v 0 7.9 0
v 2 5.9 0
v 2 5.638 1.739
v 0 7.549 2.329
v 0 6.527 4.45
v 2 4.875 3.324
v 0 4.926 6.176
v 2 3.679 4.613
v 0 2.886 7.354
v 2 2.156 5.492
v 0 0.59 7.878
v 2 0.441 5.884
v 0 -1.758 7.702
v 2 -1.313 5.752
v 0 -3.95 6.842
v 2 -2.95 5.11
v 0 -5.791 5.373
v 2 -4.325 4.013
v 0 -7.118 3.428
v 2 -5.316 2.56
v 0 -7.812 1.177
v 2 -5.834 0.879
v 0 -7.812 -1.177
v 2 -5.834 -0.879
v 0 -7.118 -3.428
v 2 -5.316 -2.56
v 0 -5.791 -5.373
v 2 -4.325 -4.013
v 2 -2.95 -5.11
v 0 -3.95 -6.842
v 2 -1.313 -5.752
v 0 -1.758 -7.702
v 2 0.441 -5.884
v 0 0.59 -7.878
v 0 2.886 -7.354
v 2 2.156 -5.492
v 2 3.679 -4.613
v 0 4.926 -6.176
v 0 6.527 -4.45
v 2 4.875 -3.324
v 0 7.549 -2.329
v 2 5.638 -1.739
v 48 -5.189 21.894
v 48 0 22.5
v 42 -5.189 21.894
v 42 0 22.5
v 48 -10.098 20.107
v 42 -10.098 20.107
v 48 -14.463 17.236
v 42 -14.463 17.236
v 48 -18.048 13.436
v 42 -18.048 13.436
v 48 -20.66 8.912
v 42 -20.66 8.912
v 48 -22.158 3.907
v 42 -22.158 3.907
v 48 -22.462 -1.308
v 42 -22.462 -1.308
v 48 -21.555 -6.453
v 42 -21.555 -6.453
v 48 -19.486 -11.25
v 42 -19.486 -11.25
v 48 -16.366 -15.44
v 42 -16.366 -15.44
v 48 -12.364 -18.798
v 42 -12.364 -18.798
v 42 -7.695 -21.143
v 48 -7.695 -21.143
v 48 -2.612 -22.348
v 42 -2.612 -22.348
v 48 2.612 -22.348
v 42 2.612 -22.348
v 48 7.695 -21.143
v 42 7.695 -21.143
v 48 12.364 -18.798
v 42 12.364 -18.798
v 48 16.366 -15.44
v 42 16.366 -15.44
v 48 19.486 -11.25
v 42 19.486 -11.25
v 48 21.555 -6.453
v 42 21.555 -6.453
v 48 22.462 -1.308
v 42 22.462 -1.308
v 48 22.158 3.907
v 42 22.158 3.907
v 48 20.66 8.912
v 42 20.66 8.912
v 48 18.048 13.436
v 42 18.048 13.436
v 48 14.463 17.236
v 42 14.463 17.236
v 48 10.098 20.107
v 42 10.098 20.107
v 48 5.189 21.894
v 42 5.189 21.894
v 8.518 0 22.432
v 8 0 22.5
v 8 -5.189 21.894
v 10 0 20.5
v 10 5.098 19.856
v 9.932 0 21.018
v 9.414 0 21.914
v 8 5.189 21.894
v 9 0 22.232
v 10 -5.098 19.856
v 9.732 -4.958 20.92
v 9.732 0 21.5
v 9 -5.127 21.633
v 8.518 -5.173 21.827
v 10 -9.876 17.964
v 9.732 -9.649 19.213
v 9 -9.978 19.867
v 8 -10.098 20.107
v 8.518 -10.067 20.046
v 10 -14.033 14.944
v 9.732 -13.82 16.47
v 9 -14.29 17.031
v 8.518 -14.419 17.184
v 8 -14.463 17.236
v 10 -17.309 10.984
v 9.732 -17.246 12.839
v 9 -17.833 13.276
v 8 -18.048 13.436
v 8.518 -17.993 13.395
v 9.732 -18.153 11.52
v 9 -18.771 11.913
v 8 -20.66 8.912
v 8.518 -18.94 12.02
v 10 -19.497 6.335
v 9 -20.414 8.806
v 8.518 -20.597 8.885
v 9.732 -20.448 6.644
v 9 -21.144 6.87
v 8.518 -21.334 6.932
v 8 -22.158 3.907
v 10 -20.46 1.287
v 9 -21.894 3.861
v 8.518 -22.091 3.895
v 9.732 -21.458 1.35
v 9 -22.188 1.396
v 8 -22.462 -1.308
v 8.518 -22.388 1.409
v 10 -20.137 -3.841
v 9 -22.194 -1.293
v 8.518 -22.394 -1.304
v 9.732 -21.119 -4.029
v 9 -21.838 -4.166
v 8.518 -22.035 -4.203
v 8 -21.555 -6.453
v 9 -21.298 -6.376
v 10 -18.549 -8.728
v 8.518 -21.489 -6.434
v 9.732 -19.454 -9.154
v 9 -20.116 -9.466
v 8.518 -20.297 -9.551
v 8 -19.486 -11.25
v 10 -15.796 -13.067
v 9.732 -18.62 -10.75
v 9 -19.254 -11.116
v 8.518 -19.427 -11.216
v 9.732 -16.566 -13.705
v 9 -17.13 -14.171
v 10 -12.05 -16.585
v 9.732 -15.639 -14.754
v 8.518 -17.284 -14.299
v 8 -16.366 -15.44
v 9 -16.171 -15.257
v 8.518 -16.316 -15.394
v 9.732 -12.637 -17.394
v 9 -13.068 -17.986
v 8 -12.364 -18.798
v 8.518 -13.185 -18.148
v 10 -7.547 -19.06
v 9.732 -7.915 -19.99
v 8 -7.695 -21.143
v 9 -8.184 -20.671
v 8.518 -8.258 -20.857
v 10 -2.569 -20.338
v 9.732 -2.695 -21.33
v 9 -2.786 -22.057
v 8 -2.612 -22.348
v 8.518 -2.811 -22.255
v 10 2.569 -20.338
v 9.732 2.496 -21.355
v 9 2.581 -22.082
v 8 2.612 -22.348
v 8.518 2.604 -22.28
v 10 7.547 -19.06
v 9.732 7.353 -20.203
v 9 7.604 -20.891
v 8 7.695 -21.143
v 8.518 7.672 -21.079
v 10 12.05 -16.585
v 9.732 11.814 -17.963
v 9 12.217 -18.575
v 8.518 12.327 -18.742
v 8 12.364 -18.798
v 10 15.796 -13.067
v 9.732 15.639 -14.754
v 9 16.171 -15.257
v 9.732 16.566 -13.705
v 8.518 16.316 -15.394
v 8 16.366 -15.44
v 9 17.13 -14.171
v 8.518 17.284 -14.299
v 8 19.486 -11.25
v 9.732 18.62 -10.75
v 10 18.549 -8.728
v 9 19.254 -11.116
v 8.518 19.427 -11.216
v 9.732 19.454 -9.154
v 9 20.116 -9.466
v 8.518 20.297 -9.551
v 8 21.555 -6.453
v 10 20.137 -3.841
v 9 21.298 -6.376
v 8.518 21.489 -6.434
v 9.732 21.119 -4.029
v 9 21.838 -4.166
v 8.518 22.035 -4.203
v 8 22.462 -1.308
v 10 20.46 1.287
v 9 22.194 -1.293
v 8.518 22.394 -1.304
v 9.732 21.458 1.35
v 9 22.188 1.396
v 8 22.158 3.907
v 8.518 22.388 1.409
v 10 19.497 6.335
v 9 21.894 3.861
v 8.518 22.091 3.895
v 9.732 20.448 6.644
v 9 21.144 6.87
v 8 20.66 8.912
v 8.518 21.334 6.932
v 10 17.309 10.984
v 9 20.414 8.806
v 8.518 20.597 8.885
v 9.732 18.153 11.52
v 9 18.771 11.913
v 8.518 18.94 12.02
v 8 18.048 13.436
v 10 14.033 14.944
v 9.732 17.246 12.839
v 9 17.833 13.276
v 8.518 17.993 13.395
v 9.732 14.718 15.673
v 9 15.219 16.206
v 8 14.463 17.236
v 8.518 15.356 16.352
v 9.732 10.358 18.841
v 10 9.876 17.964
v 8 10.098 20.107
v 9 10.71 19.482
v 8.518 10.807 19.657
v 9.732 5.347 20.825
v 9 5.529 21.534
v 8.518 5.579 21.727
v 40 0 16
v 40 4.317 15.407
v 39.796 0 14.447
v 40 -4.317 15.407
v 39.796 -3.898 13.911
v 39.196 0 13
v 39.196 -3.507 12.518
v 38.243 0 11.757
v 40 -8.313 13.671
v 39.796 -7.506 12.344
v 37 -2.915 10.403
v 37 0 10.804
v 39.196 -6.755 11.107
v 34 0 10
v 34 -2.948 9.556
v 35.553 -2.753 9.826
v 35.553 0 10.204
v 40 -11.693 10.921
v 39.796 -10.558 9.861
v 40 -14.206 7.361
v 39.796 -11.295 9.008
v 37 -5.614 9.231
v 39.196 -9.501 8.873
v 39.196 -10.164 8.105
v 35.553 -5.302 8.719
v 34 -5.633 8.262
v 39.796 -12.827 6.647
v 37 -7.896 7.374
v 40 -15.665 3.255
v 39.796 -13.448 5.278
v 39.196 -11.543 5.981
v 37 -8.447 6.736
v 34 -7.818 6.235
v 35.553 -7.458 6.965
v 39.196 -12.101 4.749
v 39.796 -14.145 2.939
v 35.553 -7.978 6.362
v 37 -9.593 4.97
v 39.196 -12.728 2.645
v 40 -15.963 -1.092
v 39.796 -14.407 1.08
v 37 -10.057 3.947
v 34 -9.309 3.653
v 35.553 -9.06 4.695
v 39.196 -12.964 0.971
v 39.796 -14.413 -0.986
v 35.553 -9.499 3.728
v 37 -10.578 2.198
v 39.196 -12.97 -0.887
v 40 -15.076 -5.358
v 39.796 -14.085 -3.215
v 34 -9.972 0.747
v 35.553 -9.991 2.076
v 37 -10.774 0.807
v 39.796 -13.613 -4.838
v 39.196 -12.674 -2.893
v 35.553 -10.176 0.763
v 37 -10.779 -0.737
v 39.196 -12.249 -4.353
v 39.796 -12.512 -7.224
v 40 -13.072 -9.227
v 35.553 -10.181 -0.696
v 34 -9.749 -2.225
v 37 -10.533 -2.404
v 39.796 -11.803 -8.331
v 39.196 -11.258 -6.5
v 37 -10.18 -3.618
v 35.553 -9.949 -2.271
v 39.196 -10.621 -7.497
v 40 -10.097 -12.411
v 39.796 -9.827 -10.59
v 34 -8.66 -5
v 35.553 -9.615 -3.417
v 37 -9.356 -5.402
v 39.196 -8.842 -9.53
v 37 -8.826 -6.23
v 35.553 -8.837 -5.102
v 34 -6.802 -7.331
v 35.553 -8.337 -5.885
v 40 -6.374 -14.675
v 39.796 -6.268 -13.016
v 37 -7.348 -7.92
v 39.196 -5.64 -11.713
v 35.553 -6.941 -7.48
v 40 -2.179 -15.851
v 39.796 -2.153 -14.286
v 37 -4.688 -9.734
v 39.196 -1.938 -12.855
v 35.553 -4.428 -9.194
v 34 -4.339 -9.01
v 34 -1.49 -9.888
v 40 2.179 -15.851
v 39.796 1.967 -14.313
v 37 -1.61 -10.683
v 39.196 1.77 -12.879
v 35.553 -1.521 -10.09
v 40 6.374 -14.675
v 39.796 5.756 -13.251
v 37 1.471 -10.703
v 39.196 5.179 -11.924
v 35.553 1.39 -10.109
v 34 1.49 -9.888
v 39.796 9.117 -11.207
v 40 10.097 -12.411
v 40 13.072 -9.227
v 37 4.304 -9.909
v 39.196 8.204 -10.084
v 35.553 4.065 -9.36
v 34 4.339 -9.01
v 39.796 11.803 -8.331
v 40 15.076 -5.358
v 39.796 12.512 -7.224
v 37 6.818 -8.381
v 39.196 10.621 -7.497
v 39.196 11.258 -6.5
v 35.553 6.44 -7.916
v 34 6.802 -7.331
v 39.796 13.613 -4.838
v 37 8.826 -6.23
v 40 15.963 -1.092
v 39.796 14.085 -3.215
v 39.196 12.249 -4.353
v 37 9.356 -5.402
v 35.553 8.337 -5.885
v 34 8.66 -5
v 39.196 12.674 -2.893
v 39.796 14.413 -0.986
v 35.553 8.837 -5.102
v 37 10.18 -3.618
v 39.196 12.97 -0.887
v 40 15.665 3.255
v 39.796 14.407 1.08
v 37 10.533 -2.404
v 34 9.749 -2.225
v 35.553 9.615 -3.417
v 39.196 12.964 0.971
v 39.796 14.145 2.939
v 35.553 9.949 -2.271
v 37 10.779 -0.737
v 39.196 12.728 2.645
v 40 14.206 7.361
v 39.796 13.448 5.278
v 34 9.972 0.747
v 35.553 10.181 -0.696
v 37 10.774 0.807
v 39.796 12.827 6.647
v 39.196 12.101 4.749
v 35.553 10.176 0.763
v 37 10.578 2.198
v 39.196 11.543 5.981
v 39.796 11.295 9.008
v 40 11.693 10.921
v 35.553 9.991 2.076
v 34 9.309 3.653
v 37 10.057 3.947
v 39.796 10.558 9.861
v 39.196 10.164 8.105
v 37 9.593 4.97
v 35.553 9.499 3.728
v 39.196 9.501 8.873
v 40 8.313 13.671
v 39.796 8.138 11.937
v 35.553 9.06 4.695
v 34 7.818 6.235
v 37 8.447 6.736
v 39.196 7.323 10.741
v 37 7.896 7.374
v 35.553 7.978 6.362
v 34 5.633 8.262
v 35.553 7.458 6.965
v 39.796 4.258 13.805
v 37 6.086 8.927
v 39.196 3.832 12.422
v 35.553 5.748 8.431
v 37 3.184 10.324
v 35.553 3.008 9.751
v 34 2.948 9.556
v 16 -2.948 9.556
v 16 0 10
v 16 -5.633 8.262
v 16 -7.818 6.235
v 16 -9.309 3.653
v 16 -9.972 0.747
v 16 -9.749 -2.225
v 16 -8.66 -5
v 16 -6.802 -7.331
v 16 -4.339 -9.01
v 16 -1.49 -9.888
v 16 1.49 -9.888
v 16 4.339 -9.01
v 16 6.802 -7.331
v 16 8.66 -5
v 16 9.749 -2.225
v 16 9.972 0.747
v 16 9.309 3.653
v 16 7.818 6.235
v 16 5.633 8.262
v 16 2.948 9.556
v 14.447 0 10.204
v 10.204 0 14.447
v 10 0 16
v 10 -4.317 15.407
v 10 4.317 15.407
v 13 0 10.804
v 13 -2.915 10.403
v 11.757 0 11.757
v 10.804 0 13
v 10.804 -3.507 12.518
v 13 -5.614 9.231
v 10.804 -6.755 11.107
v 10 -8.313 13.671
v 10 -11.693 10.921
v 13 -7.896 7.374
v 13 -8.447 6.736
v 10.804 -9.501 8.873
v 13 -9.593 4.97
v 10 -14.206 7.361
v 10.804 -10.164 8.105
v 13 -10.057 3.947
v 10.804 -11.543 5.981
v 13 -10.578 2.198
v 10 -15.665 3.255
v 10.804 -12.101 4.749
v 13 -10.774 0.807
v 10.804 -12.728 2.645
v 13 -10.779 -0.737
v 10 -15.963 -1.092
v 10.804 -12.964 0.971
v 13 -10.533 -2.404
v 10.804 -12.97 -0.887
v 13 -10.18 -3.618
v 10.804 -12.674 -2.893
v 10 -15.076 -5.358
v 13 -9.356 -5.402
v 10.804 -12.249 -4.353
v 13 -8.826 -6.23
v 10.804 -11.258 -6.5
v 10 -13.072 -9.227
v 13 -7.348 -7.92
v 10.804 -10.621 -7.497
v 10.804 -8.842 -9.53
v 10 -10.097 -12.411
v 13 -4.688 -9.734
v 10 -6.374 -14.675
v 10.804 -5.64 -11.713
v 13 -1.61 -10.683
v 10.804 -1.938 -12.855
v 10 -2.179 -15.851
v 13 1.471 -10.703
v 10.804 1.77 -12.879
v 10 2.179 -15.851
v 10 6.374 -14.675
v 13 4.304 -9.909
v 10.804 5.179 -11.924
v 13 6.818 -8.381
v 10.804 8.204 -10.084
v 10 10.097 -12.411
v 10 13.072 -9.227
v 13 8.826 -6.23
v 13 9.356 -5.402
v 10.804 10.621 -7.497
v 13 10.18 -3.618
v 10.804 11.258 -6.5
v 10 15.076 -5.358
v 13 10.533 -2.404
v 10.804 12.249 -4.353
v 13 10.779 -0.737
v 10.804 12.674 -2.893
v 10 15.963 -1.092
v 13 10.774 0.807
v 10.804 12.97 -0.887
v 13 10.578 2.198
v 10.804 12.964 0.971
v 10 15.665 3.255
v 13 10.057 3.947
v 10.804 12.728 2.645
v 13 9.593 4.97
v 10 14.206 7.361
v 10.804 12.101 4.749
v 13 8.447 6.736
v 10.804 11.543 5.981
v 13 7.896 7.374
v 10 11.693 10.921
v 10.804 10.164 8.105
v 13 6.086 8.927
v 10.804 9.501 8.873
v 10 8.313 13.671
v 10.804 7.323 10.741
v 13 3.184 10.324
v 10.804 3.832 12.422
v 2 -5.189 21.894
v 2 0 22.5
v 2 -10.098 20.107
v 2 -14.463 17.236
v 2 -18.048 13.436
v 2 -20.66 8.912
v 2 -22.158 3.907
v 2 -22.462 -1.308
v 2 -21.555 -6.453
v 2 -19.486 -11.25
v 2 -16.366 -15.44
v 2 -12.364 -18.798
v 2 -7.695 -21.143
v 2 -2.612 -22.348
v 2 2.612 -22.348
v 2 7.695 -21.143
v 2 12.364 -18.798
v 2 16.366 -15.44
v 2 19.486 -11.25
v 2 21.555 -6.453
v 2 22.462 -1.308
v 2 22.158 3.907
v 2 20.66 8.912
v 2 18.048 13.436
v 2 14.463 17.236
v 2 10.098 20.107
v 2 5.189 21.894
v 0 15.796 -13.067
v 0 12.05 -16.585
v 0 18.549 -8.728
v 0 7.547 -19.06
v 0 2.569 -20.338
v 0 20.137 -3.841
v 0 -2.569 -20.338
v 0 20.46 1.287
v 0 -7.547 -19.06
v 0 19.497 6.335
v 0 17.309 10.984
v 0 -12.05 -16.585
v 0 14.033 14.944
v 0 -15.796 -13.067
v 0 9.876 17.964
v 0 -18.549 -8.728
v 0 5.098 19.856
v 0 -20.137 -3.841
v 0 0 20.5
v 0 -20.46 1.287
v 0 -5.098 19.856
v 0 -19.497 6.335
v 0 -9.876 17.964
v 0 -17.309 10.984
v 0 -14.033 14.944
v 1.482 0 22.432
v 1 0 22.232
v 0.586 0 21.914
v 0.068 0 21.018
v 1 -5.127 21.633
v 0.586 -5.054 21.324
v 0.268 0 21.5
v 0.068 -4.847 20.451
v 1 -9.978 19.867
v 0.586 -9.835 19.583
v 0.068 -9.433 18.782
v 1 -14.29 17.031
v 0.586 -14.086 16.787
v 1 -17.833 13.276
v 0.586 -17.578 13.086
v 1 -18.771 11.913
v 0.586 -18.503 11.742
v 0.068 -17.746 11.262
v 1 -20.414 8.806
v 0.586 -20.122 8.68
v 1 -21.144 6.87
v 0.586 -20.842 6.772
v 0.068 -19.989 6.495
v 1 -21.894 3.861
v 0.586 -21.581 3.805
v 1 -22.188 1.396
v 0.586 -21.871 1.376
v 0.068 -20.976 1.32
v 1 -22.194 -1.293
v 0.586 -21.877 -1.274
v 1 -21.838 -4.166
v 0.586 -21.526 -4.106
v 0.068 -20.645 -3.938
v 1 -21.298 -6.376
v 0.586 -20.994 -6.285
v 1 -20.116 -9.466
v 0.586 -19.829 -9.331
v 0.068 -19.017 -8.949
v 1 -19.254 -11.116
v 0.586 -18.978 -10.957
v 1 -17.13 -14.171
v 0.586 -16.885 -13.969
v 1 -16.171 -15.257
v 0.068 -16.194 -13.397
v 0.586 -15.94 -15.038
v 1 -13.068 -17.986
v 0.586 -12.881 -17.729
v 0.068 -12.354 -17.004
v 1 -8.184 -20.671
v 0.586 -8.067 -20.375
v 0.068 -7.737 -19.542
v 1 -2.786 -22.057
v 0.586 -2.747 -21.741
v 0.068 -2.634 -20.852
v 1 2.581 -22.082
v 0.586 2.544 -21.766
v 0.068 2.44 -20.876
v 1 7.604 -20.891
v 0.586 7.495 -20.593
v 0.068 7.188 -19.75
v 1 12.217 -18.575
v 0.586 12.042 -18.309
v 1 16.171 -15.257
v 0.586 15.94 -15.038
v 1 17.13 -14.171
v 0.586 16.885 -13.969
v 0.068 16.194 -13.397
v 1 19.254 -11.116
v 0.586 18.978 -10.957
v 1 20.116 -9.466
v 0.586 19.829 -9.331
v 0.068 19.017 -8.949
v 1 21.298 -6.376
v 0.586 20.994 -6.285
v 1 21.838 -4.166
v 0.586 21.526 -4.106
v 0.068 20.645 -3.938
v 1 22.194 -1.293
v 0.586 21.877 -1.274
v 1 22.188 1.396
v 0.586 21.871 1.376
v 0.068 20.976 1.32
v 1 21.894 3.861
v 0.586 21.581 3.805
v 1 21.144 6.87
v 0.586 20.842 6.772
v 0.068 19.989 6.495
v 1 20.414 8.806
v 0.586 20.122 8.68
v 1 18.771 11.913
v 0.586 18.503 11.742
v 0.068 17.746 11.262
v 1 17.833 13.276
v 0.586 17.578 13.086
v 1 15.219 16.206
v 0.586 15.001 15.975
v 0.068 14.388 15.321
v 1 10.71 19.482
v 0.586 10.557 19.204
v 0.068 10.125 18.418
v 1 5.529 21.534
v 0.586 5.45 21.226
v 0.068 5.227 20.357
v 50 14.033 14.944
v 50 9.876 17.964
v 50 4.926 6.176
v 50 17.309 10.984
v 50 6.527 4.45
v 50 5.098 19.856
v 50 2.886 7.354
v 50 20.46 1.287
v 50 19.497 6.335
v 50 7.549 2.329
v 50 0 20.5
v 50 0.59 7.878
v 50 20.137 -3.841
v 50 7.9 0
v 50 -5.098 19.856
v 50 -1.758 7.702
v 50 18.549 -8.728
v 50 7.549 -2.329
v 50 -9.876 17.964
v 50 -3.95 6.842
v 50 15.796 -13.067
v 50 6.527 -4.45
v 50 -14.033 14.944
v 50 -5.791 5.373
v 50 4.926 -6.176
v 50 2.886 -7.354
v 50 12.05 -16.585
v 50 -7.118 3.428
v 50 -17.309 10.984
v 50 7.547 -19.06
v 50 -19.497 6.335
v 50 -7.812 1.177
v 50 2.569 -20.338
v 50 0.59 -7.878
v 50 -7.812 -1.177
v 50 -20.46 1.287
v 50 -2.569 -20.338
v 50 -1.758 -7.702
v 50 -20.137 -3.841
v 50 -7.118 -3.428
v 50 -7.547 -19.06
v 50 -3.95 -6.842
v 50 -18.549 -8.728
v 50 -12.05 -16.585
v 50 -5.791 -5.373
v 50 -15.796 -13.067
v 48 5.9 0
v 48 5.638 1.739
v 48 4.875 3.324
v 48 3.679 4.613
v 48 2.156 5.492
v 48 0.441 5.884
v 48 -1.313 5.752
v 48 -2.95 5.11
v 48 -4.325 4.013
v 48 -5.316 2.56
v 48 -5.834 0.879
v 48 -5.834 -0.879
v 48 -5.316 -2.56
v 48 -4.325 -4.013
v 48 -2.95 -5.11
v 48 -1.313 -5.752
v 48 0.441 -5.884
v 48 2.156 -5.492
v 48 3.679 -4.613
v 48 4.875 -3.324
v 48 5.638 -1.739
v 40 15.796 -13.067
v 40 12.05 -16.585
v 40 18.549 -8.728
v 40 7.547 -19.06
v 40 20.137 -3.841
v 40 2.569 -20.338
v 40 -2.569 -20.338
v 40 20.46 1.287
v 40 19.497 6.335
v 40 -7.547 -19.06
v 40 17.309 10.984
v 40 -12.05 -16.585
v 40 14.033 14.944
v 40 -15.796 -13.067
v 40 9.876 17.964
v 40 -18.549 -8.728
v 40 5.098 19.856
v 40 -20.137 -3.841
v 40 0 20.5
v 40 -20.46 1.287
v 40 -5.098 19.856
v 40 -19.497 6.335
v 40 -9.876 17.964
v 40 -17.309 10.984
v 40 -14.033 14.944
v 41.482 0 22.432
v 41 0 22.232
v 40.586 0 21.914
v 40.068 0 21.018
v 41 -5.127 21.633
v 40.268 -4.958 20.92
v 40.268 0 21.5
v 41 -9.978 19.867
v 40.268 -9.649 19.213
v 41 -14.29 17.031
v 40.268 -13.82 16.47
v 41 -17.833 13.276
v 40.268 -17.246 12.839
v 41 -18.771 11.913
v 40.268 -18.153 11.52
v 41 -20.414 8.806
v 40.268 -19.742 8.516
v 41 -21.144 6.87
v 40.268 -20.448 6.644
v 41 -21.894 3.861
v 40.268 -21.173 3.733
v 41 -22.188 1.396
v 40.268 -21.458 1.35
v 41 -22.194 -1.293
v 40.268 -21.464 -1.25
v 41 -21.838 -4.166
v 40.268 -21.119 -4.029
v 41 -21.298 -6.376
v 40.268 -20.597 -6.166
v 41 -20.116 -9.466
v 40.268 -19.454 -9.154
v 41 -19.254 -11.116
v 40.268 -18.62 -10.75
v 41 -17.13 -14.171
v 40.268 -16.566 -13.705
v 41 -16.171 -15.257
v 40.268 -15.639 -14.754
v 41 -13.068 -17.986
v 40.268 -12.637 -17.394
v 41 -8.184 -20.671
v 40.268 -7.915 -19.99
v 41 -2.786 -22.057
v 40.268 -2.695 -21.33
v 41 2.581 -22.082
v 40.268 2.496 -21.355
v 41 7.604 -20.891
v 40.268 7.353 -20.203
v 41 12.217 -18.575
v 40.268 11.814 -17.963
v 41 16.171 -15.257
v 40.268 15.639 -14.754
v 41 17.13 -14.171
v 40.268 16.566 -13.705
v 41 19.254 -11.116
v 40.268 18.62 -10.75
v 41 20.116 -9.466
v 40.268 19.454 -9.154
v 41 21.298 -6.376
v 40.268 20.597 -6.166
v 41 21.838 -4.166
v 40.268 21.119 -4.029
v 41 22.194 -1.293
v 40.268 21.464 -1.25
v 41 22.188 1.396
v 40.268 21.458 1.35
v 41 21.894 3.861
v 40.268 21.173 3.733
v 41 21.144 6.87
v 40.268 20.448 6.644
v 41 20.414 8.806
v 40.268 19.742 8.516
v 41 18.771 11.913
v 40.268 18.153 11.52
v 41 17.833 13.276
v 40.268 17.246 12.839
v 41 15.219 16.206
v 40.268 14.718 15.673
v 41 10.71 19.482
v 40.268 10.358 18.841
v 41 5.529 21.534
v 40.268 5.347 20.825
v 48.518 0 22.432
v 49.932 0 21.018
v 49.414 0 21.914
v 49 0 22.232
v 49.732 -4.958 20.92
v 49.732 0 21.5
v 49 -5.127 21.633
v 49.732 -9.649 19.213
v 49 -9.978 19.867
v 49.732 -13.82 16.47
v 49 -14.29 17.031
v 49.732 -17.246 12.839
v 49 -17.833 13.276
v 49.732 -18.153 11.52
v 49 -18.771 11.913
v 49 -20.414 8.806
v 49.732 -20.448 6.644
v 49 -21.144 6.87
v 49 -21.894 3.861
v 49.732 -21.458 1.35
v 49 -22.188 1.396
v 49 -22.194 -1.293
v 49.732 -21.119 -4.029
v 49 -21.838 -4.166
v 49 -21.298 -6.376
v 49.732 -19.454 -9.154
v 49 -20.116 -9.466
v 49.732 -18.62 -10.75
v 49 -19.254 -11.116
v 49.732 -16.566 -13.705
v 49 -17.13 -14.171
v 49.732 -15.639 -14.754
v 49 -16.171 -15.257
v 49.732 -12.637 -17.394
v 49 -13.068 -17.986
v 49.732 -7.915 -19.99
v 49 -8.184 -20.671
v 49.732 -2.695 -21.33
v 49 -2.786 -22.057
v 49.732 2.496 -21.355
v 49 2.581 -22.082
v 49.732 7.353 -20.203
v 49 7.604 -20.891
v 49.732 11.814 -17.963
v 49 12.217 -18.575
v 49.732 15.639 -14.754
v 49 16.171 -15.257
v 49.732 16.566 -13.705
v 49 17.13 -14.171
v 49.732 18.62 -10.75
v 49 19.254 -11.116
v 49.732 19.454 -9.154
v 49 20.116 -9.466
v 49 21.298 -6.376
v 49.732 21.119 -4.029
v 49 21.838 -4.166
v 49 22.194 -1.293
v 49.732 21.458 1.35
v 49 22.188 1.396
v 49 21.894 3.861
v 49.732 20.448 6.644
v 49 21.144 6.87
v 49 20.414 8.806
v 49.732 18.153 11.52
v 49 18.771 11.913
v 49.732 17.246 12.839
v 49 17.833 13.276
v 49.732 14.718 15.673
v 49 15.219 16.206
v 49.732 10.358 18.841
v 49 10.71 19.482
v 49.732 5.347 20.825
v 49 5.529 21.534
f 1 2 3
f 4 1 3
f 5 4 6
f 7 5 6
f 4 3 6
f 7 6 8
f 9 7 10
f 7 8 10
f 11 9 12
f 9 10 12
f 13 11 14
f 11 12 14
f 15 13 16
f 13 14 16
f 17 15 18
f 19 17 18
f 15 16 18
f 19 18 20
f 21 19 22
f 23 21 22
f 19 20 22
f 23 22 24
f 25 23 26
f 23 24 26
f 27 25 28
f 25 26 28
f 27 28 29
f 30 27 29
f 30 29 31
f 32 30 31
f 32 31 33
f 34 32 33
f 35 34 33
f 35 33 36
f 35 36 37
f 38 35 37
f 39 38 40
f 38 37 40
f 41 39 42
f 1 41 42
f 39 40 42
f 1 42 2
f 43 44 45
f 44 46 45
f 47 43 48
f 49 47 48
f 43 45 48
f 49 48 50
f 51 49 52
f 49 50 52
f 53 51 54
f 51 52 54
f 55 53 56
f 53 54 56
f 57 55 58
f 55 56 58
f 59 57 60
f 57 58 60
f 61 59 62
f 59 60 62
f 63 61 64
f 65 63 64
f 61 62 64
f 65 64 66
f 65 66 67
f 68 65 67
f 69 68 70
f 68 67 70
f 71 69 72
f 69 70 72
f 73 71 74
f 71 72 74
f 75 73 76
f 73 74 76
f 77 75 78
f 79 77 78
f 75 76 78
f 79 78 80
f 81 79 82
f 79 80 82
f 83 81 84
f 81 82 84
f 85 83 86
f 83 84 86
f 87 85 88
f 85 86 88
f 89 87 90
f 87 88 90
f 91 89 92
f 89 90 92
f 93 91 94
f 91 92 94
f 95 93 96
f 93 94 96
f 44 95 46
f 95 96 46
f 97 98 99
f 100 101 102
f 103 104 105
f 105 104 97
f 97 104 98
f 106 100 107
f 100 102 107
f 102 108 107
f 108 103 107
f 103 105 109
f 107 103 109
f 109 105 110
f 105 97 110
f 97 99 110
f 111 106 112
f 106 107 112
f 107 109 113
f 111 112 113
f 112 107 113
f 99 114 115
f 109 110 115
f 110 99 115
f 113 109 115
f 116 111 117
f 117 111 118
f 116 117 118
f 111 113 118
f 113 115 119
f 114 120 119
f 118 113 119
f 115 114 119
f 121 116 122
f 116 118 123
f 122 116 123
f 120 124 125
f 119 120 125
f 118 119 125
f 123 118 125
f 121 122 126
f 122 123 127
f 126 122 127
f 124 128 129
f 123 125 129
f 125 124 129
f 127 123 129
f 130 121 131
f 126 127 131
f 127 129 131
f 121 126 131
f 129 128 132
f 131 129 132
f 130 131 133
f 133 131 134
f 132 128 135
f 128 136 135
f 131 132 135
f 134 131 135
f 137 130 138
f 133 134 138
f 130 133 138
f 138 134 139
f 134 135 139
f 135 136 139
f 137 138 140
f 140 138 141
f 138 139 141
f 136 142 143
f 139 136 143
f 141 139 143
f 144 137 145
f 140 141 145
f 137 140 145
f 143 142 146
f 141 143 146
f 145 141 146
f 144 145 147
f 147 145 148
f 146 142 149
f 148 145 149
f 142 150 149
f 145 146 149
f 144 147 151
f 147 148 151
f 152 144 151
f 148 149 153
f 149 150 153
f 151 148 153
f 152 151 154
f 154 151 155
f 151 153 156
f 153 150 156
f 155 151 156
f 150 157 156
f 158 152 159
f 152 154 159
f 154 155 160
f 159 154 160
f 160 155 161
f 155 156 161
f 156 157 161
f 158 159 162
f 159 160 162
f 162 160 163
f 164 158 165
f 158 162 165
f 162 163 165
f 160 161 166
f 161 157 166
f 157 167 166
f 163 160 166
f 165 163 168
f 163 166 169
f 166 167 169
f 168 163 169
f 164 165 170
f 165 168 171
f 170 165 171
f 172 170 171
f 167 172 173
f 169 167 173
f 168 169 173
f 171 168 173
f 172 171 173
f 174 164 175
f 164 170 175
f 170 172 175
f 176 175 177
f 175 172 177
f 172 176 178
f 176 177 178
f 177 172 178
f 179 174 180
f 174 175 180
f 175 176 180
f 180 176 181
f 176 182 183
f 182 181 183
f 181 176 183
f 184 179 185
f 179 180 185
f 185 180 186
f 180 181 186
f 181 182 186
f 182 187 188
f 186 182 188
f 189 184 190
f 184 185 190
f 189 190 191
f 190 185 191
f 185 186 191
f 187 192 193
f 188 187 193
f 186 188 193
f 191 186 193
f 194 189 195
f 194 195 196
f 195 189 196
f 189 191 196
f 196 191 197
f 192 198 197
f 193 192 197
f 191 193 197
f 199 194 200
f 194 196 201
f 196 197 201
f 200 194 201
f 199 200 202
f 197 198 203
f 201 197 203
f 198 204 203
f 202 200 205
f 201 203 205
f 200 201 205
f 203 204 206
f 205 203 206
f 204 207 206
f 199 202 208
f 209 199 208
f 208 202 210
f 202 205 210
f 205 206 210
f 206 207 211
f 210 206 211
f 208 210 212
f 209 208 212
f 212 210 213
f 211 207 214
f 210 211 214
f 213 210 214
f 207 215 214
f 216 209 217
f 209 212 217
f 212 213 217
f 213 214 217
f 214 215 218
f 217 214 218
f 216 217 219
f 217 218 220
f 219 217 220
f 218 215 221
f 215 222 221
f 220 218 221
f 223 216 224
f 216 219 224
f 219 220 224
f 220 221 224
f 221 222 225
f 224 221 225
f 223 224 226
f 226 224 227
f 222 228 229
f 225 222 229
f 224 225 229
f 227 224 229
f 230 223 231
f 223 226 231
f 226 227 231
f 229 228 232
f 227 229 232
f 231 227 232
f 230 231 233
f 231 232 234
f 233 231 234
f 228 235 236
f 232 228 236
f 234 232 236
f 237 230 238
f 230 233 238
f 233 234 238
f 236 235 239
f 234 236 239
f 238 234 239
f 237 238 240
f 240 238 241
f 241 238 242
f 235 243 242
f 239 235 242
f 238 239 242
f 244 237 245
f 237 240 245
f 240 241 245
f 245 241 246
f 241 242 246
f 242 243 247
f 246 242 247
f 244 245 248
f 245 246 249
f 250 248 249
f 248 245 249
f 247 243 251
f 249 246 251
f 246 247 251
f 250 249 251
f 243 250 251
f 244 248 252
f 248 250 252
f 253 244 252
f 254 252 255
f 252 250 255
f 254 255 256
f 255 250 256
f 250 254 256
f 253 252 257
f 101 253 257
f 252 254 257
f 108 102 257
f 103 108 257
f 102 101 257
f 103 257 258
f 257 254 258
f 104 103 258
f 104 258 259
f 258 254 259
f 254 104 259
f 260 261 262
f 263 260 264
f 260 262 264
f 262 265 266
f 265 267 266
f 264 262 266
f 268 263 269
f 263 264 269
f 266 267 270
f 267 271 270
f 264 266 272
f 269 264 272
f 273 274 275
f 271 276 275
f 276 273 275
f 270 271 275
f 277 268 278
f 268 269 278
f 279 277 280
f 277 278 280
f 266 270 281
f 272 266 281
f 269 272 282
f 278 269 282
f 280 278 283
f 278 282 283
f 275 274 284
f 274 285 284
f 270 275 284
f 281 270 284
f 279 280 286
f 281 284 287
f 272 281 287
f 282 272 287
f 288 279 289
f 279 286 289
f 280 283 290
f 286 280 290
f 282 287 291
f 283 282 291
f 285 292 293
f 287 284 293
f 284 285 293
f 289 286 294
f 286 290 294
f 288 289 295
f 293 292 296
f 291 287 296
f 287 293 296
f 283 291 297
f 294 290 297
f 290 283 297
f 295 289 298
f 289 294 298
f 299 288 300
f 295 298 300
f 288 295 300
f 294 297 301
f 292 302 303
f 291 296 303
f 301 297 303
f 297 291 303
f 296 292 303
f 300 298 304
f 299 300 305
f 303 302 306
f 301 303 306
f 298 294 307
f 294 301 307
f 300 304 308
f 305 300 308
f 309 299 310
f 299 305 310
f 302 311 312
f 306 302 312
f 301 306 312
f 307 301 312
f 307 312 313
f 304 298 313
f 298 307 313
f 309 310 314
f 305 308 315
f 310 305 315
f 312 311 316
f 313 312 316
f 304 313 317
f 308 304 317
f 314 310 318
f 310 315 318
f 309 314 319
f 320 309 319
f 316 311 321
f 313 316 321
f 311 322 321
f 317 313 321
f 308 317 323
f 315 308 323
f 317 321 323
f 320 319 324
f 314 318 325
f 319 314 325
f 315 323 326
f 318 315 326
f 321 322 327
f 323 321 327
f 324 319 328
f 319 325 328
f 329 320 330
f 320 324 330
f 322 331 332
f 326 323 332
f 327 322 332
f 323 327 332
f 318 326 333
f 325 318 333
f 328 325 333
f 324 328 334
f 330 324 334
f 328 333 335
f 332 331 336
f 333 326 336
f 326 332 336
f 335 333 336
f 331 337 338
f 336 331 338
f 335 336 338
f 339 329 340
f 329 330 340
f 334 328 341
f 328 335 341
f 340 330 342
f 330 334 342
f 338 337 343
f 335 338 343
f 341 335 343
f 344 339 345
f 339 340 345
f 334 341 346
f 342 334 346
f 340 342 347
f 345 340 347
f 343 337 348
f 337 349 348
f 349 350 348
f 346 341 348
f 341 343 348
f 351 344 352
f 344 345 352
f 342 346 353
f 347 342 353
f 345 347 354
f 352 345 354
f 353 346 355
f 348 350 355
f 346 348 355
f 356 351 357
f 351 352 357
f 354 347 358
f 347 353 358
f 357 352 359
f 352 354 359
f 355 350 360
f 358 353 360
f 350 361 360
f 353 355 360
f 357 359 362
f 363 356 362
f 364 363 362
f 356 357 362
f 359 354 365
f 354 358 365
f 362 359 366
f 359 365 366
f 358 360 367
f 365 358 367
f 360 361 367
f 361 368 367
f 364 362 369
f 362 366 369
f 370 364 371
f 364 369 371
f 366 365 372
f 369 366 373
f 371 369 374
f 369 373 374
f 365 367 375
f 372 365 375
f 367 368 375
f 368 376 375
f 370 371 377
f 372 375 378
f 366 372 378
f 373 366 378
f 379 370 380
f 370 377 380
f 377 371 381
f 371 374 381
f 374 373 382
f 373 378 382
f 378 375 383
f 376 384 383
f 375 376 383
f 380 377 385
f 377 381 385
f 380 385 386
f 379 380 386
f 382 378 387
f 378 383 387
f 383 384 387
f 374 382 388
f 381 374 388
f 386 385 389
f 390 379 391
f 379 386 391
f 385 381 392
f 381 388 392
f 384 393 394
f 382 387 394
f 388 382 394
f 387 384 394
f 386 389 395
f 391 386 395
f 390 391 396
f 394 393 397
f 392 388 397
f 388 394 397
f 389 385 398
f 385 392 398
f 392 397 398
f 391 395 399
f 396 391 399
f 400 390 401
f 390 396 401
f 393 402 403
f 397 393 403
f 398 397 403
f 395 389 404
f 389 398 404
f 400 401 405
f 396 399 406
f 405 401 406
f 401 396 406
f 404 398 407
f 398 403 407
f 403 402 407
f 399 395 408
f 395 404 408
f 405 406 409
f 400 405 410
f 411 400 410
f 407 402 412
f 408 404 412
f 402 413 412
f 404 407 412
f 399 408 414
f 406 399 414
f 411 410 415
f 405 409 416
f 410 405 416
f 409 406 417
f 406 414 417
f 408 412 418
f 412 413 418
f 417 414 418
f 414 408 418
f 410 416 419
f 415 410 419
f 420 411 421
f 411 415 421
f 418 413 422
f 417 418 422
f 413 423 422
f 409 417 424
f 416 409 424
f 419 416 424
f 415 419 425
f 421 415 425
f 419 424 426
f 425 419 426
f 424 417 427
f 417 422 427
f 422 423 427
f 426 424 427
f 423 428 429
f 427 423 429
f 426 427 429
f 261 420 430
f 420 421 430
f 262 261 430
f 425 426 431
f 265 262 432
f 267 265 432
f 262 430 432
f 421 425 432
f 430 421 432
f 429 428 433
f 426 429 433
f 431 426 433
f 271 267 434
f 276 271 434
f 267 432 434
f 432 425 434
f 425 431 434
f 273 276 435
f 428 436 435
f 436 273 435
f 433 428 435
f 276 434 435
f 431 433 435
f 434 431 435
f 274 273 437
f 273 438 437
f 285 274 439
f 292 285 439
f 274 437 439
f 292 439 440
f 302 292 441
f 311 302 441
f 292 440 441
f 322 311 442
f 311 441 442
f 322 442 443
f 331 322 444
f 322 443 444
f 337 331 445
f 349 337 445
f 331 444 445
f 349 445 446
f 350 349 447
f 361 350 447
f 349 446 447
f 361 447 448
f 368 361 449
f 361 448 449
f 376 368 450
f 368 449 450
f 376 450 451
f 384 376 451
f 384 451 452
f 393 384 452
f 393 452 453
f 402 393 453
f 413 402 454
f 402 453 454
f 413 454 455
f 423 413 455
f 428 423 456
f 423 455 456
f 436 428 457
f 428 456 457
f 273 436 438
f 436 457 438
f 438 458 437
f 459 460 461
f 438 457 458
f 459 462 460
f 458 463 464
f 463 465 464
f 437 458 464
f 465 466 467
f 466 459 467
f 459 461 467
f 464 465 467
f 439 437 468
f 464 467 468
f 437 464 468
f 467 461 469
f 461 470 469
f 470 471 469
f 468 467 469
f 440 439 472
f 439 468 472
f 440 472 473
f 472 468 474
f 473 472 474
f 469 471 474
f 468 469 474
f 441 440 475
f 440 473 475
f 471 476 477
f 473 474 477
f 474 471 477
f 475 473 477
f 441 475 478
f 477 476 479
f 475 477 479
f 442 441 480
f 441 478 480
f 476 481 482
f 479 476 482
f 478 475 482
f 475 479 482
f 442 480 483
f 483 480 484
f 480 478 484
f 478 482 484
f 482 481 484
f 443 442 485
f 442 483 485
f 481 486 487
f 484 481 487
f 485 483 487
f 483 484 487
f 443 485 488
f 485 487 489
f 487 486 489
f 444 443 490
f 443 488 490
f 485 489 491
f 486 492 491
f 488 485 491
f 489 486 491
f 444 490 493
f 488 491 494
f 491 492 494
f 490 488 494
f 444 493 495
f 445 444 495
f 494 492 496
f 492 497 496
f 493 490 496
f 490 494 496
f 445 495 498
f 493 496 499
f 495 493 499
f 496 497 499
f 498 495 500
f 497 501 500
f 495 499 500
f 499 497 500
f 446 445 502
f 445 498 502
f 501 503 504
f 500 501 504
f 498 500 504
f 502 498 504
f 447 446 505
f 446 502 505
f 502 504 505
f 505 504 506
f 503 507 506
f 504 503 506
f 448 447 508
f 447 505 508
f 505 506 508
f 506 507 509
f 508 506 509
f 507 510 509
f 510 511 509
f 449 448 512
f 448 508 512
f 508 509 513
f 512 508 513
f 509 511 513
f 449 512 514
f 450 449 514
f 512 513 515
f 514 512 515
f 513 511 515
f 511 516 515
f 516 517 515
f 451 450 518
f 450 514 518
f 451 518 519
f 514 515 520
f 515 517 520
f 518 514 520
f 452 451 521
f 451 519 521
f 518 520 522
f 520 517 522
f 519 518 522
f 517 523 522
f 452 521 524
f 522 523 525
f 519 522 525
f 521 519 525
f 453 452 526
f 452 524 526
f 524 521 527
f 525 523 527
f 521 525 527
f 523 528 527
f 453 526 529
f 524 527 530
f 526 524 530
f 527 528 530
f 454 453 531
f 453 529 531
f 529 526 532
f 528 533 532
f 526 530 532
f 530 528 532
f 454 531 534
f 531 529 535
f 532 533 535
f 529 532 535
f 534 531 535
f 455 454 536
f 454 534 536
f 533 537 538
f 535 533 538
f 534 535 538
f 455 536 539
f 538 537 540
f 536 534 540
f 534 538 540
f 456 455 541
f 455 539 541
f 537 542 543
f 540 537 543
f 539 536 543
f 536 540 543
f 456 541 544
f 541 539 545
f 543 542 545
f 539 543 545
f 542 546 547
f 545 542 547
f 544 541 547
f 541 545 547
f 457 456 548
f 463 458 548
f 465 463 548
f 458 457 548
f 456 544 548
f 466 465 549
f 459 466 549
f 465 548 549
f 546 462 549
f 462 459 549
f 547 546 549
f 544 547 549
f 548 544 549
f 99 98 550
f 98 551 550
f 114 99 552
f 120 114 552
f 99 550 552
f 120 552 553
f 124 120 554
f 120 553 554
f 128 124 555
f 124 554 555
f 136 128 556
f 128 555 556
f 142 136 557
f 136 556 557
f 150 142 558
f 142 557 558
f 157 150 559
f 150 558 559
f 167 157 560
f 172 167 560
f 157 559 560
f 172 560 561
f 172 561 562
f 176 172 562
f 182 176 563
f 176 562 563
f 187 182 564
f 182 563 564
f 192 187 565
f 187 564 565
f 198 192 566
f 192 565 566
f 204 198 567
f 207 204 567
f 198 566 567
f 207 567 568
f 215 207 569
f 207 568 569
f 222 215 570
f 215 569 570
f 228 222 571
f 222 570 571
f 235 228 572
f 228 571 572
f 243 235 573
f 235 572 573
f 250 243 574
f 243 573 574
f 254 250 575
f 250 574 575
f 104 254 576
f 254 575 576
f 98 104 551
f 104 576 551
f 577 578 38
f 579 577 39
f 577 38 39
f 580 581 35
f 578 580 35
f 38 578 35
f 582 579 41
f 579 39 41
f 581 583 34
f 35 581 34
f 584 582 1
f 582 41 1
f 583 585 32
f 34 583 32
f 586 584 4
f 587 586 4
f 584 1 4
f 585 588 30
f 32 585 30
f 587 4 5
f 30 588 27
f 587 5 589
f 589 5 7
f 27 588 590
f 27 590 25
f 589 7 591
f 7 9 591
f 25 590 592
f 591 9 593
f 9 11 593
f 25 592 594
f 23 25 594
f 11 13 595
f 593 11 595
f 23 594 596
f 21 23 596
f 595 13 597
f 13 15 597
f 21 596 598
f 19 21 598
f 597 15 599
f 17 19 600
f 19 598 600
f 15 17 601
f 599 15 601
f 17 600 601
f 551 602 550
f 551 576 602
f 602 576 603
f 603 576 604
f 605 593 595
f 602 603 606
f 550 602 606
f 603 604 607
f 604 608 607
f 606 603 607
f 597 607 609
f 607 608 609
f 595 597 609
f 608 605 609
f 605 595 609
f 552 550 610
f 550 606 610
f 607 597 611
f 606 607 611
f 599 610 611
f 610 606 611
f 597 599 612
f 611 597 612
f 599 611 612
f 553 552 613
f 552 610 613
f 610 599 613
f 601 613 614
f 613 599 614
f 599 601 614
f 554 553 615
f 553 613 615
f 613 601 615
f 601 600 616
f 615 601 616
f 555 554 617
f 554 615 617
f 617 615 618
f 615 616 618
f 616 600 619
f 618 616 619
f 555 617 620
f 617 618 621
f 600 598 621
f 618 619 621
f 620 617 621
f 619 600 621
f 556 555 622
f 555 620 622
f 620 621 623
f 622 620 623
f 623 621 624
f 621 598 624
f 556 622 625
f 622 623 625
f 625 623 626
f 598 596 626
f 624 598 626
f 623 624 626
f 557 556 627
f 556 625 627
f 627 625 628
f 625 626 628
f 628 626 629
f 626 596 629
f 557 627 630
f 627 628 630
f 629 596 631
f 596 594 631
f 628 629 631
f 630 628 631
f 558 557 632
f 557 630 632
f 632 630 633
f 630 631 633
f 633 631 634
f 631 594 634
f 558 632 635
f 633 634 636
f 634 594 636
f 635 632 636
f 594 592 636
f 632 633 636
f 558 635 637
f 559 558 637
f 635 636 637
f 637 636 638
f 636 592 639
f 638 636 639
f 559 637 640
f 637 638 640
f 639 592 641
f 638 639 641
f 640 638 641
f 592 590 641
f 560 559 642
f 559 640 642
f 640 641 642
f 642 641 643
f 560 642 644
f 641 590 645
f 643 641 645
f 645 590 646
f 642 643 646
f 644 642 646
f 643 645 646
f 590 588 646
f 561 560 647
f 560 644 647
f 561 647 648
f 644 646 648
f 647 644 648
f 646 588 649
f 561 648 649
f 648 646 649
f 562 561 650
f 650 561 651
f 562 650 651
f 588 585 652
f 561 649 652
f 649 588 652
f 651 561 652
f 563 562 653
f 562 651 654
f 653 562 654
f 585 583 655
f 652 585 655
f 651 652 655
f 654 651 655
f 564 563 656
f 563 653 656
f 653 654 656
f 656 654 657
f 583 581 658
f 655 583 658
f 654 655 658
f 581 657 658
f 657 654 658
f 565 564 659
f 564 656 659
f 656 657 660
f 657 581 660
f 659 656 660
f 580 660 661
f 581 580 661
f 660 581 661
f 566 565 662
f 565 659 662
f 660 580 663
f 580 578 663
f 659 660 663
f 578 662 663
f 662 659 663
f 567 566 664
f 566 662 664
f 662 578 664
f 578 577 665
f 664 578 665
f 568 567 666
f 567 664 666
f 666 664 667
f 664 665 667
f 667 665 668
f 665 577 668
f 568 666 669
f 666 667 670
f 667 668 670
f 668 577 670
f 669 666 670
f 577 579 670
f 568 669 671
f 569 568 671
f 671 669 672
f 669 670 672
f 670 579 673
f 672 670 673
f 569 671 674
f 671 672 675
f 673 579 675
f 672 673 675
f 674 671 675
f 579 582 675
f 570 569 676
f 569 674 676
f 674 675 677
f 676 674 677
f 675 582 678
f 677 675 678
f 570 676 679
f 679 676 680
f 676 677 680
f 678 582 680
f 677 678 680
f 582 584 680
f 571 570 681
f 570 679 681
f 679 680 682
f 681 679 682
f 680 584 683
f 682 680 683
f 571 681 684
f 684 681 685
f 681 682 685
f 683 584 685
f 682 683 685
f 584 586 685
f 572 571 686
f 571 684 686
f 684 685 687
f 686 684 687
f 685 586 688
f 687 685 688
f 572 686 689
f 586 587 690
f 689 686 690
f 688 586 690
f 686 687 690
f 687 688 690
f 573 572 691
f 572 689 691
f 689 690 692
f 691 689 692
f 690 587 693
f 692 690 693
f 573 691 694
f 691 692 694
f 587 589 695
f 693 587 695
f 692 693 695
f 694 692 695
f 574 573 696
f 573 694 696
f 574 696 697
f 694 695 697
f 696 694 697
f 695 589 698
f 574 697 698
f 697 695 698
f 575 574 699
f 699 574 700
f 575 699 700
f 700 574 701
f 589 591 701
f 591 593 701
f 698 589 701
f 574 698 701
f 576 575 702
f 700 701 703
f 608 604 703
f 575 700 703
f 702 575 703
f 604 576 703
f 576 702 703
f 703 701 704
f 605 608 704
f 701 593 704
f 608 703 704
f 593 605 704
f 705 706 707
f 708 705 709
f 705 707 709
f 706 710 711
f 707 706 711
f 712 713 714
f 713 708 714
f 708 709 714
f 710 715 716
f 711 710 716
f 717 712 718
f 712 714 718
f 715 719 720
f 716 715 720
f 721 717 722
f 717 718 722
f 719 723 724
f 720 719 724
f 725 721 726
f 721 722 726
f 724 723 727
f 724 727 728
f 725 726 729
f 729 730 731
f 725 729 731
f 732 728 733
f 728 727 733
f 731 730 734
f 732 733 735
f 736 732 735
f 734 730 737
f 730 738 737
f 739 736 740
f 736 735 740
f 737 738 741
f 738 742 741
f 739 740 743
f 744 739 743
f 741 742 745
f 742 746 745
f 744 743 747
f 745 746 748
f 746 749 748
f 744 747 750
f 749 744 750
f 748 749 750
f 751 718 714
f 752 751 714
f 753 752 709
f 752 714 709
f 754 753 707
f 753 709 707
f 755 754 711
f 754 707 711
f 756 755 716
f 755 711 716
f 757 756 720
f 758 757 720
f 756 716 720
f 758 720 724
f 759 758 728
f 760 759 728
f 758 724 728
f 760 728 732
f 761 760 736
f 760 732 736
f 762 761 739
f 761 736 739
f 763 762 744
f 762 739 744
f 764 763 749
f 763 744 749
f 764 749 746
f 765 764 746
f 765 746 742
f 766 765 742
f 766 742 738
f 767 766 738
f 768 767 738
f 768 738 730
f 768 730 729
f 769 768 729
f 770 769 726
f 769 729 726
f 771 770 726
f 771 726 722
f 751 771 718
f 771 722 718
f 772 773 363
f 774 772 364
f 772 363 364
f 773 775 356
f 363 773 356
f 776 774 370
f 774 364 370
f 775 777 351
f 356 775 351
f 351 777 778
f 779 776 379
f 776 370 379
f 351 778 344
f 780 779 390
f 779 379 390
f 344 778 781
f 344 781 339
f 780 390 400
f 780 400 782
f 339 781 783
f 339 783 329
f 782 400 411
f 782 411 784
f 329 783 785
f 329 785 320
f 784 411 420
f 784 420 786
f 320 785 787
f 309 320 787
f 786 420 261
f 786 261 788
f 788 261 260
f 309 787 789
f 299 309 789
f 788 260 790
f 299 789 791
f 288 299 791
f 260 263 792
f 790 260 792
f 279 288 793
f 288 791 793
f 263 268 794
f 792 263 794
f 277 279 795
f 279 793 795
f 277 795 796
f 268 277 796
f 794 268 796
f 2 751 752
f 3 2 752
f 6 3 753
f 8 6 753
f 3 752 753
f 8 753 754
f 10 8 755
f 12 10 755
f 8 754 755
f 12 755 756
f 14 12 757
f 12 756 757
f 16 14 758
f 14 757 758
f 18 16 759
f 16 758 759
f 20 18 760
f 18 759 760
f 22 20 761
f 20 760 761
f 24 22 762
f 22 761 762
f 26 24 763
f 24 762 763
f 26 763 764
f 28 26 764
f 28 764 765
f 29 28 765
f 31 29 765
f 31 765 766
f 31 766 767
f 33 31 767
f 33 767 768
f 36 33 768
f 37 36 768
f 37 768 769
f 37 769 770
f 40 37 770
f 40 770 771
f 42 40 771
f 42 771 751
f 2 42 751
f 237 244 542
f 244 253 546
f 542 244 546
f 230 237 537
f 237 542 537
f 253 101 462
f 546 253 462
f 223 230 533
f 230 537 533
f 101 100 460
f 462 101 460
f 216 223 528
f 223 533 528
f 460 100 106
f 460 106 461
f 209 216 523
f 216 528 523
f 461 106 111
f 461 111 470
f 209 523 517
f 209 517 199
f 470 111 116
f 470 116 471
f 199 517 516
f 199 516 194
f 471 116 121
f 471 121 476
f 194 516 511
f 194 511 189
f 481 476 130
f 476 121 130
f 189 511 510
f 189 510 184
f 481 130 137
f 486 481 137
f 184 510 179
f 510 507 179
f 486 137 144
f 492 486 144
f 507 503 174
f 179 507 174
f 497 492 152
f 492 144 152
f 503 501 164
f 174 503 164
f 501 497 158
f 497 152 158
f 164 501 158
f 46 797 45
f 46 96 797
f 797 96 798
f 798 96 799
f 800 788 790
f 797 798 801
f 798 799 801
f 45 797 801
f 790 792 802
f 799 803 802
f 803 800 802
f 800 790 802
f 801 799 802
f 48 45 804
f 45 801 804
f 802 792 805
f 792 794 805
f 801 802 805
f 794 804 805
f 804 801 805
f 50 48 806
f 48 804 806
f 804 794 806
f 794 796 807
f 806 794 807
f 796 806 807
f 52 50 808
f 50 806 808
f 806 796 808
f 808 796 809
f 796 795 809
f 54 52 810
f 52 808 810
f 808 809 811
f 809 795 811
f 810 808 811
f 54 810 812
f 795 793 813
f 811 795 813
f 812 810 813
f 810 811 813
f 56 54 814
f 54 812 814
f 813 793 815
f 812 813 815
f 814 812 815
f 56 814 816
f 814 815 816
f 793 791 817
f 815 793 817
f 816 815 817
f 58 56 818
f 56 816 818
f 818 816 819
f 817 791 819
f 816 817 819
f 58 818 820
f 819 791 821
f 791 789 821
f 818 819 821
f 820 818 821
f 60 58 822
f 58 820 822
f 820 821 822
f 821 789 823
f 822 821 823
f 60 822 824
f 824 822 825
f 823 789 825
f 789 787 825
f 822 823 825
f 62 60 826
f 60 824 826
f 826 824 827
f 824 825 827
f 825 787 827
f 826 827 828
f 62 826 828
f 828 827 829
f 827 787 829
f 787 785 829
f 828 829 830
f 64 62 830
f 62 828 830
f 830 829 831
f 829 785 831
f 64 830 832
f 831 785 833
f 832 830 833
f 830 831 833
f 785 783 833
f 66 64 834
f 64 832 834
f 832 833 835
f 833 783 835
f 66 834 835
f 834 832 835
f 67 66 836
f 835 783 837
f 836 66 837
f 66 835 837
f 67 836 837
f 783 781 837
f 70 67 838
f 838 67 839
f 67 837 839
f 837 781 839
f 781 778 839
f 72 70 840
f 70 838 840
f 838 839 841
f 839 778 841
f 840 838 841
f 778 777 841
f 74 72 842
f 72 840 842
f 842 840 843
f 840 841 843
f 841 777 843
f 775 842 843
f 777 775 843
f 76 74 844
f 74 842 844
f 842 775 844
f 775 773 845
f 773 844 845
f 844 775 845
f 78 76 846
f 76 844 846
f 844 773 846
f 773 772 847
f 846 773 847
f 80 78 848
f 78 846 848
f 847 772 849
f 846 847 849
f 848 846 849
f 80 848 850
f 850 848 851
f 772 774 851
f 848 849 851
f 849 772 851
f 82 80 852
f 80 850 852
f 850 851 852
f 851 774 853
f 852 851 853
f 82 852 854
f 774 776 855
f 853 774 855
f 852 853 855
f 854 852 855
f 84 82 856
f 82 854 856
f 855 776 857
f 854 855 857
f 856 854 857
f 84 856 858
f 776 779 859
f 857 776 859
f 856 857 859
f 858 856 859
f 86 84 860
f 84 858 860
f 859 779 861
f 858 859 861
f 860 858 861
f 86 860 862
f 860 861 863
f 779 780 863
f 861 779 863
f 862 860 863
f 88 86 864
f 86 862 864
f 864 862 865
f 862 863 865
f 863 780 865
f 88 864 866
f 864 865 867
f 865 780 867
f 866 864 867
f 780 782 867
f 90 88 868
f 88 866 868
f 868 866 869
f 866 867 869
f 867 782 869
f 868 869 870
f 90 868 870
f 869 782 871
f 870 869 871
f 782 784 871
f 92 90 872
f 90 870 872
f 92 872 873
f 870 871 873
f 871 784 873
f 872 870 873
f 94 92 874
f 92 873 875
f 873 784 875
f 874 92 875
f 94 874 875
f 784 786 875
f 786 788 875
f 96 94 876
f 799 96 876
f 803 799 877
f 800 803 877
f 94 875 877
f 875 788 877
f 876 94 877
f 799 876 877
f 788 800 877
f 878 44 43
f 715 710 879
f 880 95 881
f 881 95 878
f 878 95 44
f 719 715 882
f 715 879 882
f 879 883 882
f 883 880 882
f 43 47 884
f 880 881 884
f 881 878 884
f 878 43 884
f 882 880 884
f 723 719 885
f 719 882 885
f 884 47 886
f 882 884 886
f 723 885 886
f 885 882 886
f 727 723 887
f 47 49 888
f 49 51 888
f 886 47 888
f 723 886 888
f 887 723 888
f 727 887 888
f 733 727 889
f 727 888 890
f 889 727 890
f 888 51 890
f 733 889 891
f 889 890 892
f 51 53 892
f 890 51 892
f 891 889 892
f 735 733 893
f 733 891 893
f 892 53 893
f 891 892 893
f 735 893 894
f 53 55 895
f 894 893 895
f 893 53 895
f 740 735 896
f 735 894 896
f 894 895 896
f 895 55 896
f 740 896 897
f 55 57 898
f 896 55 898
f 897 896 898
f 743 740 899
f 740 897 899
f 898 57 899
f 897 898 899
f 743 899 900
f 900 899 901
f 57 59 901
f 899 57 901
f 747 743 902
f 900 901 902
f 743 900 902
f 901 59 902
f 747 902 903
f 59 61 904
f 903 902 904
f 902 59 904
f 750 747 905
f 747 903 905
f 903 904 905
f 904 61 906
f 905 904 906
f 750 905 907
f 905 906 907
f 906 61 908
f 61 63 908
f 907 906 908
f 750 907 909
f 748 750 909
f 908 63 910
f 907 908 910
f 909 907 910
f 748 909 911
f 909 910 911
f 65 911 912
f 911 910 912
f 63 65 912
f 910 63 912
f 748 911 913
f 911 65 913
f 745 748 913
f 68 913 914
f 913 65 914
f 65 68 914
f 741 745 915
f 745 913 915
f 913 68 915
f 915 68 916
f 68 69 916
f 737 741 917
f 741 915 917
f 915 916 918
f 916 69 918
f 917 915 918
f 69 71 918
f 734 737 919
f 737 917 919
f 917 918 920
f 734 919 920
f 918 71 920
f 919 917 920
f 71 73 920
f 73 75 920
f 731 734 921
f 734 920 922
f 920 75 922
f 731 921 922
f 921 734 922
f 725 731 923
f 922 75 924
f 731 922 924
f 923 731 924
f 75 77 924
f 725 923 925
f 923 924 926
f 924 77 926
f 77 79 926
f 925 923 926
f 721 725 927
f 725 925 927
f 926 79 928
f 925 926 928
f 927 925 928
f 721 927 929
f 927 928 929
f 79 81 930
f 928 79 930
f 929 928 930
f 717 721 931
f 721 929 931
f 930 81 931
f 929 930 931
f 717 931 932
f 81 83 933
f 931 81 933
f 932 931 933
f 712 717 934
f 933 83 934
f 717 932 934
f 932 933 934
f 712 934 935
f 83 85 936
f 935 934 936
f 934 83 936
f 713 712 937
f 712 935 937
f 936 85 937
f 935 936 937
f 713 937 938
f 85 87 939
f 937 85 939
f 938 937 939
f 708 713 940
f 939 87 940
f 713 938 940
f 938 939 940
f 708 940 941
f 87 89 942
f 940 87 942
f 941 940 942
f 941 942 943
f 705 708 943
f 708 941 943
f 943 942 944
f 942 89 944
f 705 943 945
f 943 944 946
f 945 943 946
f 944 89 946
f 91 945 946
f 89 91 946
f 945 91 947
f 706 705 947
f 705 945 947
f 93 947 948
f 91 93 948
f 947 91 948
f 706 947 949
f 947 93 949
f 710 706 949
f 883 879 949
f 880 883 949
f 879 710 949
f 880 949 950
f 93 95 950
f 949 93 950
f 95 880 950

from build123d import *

# Parameters (mm, degrees)
F2_R     = 5.9
F3_DEPTH = 50.001
F4_SIZE  = 2


with BuildPart() as f1:
    # F0 (on Front) → F1 (revolve)
    with BuildSketch(Plane.XZ):
        with BuildLine():
            ThreePointArc((2, 22.5), (0.585786, 21.914214), (0, 20.5))
            Line((0, 20.5), (0, 0))
            Line((0, 0), (50, 0))
            Line((50, 0), (50, 20.5))
            ThreePointArc((50, 20.5), (49.414214, 21.914214), (48, 22.5))
            Line((48, 22.5), (42, 22.5))
            ThreePointArc((42, 22.5), (40.585786, 21.914214), (40, 20.5))
            Line((40, 20.5), (40, 16))
            ThreePointArc((40, 16), (38.242641, 11.757359), (34, 10))
            Line((34, 10), (16, 10))
            ThreePointArc((16, 10), (11.757359, 11.757359), (10, 16))
            Line((10, 16), (10, 20.5))
            ThreePointArc((10, 20.5), (9.414214, 21.914214), (8, 22.5))
            Line((8, 22.5), (2, 22.5))
        make_face()
    revolve(axis=Axis((25, 0, 0), (1, 0, 0)))

    # F2 (on face) → F3 (cut, through all)
    with BuildSketch(Plane.YZ.offset(50)):
        Circle(F2_R)
    extrude(amount=-F3_DEPTH, mode=Mode.SUBTRACT)

    # F4
    f4_edges = [f1.edges().sort_by_distance(p)[0] for p in [
        (50, -5.9, 0),
        (25, 5.9, 0),
        (0, -5.9, 0),
    ]]
    chamfer(f4_edges, length=F4_SIZE)


solid = f1.part
